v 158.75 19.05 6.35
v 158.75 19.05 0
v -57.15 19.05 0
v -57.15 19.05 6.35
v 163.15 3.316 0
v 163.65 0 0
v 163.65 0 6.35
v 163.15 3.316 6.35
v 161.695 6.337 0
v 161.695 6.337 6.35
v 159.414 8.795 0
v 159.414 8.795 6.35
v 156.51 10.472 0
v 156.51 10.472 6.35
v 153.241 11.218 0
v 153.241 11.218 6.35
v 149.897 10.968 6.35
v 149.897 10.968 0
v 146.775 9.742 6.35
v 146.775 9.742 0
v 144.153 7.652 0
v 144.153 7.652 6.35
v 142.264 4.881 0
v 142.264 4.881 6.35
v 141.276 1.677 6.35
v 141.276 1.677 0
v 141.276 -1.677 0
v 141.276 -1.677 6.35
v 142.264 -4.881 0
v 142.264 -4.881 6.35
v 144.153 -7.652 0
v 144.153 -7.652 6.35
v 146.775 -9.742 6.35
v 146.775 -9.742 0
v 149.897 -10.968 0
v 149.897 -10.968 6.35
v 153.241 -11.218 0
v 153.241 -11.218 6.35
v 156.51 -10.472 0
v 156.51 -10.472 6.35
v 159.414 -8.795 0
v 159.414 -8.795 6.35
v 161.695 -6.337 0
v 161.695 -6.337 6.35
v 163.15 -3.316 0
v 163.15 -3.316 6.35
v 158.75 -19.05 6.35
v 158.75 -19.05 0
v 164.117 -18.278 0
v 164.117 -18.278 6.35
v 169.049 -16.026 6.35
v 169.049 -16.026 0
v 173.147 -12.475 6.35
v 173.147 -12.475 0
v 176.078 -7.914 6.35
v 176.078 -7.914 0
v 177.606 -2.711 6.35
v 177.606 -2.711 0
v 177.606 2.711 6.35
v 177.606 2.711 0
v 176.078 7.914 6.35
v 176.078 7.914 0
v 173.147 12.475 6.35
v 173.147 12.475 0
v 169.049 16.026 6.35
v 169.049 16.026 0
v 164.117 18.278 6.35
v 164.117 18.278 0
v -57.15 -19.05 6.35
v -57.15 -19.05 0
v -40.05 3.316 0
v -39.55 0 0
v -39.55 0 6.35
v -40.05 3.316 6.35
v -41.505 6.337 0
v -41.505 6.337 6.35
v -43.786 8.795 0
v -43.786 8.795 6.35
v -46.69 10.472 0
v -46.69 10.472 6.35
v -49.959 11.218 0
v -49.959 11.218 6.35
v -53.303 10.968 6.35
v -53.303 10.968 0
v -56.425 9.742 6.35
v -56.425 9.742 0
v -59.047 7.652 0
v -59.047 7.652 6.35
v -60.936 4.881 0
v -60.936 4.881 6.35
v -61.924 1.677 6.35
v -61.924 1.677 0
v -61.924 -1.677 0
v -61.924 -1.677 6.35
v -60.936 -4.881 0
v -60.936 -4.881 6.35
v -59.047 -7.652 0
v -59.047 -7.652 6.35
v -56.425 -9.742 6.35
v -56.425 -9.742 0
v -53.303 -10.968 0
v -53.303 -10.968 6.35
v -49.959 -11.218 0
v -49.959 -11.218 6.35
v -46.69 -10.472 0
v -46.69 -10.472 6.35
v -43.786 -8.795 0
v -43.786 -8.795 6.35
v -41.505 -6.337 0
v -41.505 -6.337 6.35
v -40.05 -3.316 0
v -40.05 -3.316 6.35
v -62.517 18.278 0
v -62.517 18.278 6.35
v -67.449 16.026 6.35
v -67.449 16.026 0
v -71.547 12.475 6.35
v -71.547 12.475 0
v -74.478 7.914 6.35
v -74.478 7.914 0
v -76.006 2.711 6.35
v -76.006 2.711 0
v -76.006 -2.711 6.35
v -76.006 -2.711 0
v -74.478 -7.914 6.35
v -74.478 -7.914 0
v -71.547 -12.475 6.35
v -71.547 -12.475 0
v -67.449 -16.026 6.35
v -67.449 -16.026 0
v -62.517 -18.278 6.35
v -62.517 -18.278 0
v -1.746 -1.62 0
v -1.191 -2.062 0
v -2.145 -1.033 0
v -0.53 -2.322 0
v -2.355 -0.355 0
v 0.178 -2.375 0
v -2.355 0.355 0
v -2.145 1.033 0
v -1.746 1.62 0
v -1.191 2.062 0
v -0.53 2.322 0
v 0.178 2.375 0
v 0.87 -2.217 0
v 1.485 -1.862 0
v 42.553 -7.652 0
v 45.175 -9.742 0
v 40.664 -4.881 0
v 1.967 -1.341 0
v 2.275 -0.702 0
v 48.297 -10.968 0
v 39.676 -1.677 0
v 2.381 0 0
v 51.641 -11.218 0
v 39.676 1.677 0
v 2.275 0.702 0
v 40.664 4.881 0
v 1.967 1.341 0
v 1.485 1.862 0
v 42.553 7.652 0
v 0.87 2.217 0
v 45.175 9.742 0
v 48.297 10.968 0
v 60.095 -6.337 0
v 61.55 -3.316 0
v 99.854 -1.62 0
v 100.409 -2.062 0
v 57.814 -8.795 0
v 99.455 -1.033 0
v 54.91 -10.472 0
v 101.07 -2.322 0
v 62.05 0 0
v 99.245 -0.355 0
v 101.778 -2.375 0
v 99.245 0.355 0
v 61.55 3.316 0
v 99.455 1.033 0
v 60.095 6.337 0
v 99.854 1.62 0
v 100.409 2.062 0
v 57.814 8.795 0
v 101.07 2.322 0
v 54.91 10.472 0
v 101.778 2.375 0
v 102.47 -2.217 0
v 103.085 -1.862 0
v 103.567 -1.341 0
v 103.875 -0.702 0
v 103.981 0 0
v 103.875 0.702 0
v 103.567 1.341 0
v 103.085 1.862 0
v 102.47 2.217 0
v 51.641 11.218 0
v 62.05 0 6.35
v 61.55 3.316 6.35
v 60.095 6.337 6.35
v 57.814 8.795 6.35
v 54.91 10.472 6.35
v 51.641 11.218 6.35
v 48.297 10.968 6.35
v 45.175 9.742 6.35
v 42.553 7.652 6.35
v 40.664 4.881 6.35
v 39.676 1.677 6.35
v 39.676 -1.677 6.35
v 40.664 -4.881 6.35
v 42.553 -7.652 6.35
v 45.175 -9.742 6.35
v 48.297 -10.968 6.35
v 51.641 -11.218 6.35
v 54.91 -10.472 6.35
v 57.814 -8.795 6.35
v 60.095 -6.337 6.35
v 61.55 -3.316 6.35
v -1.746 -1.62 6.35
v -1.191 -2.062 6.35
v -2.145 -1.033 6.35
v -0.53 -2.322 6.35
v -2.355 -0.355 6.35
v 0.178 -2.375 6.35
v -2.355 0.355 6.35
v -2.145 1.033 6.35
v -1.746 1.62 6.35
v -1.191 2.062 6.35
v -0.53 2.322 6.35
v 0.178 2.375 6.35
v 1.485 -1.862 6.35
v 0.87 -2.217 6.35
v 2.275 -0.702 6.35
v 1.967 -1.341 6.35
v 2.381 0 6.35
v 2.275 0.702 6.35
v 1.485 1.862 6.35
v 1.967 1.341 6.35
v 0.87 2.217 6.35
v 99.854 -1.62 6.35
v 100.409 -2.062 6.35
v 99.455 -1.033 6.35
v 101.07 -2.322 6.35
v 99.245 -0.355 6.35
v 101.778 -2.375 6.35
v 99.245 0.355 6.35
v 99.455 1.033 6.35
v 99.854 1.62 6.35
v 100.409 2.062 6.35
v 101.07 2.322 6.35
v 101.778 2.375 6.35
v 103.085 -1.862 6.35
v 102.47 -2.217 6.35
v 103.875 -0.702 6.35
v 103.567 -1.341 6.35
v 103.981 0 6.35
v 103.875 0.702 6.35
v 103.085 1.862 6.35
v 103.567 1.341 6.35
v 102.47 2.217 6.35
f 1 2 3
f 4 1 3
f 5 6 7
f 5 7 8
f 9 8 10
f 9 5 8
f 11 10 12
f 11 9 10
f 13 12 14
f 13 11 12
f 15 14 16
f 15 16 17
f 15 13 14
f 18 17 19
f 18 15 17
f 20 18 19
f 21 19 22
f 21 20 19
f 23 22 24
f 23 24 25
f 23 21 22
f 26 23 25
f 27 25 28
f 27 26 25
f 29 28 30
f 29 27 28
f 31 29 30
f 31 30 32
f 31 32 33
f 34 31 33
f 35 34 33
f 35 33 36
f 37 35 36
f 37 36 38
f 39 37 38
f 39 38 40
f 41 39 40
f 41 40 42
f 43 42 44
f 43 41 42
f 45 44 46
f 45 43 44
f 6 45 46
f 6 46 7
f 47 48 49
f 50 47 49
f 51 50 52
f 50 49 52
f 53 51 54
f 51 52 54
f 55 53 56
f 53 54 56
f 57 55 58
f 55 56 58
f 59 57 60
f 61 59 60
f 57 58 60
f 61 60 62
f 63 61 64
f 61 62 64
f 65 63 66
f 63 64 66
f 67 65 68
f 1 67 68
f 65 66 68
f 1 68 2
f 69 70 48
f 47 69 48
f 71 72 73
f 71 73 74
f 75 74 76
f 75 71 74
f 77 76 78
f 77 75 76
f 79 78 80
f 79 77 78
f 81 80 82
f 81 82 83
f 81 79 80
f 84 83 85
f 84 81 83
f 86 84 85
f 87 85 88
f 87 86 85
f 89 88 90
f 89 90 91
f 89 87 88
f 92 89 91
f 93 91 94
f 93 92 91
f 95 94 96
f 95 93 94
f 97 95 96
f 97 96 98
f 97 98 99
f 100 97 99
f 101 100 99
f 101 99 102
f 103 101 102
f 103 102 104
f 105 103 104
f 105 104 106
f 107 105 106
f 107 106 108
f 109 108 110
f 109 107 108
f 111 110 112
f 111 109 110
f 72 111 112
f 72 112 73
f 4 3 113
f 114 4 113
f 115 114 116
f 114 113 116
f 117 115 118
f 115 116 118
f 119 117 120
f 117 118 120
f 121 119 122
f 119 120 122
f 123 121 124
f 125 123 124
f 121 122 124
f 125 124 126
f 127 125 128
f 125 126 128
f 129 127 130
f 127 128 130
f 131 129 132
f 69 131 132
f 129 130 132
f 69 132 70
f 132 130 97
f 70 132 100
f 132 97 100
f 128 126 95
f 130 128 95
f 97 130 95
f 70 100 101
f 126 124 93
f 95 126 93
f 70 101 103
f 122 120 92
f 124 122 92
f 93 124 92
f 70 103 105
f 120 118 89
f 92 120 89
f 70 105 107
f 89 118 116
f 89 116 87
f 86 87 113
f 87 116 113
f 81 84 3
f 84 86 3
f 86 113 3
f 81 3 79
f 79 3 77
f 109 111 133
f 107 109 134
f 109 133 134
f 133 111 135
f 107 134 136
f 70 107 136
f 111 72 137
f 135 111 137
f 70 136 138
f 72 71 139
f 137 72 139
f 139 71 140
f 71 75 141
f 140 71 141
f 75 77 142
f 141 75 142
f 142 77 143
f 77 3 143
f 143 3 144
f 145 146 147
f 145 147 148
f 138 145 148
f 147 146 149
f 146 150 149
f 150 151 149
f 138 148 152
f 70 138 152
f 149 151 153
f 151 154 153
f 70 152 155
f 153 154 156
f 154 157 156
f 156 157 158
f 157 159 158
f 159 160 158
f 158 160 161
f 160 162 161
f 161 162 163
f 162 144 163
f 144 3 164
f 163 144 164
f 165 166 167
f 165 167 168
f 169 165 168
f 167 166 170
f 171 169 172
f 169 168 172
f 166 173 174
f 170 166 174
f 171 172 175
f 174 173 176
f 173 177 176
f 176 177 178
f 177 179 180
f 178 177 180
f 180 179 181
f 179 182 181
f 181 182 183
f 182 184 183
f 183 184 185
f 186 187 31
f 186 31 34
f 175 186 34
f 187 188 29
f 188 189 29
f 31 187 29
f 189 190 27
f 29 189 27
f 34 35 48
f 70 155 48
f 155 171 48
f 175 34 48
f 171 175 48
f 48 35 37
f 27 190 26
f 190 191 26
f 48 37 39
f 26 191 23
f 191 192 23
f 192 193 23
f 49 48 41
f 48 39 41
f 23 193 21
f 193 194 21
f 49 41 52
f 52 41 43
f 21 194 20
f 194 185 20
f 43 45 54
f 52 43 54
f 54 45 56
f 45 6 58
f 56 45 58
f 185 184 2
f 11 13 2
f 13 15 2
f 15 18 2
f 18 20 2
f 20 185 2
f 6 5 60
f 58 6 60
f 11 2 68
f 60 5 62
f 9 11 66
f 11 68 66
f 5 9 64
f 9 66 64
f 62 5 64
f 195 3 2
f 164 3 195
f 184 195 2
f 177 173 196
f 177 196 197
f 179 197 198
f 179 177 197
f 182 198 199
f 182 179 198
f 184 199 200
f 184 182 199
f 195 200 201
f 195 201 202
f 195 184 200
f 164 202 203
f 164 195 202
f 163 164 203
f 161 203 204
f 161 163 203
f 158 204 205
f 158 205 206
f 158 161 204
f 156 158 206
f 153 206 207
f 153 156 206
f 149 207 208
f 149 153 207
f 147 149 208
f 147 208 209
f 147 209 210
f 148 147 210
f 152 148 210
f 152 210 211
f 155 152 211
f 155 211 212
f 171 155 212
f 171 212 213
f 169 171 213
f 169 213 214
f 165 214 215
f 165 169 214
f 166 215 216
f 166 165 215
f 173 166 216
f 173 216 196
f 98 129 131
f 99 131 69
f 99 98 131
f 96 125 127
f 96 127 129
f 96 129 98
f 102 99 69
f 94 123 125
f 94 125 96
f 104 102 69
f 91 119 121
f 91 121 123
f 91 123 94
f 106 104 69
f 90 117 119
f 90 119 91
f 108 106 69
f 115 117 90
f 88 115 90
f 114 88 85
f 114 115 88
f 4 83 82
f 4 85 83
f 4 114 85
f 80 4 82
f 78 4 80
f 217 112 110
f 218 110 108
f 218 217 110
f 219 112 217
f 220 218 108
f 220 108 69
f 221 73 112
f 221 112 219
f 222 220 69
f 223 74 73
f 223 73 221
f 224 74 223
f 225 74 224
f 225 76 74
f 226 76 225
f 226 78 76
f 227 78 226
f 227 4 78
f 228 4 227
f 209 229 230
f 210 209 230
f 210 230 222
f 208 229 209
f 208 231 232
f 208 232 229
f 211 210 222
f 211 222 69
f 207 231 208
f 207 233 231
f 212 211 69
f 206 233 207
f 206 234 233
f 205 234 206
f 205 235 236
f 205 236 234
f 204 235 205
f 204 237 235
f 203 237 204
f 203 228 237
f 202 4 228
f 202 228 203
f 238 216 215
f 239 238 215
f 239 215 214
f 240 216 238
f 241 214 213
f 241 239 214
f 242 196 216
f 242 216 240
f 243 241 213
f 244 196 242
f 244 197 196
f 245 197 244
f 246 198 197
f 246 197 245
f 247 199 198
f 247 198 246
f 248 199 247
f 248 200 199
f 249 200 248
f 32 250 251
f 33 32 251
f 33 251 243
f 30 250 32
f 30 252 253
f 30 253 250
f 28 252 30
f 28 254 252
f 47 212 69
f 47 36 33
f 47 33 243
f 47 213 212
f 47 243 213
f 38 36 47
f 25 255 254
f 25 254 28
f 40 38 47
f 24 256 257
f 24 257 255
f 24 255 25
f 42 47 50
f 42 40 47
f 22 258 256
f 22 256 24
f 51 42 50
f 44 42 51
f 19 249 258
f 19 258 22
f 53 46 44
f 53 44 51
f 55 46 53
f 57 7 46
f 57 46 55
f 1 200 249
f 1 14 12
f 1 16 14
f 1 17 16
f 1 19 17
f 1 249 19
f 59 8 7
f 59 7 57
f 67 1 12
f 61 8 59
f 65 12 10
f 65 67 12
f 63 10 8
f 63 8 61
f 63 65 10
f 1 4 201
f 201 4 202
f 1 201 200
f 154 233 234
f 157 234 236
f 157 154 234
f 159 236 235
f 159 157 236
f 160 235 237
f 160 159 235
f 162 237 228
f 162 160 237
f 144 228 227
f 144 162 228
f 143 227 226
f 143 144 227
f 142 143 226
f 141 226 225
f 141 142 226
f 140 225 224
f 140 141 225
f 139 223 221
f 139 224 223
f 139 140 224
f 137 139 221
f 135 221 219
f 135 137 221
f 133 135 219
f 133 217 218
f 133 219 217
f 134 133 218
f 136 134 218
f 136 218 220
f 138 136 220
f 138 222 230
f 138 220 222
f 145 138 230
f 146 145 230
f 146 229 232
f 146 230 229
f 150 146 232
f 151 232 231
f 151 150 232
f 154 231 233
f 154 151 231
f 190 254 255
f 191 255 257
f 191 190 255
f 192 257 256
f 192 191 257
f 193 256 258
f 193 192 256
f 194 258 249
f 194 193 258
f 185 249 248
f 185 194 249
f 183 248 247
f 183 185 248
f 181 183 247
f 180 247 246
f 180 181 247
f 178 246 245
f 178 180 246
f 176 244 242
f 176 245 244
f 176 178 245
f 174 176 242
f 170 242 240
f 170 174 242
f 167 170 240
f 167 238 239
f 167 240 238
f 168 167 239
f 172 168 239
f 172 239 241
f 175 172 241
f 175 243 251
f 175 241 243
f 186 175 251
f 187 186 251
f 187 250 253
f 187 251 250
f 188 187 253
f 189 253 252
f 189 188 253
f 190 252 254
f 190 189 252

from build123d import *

# Parameters (mm, degrees)
F0_R     = 11.24966
F2_DEPTH = 6.35
F1_R     = 2.38125
F3_DEPTH = 25.4


with BuildPart() as f2:
    # F0 (on Top) → F2 (new body)
    with BuildSketch(Plane.XY):
        with BuildLine():
            Line((158.75, 19.05), (-57.15, 19.05))
            ThreePointArc((-57.15, 19.05), (-76.2, 0), (-57.15, -19.05))
            Line((-57.15, -19.05), (158.75, -19.05))
            ThreePointArc((158.75, -19.05), (177.8, 0), (158.75, 19.05))
        make_face()
        with Locations((-50.8, 0)):
            Circle(F0_R, mode=Mode.SUBTRACT)
        with Locations((50.8, 0)):
            Circle(F0_R, mode=Mode.SUBTRACT)
        with Locations((152.4, 0)):
            Circle(F0_R, mode=Mode.SUBTRACT)
    extrude(amount=F2_DEPTH)

    # F1 (on face) → F3 (cut)
    with BuildSketch(Plane.XY):
        Circle(F1_R)
        with Locations((101.6, 0)):
            Circle(F1_R)
    extrude(amount=F3_DEPTH, mode=Mode.SUBTRACT)


solid = f2.part
